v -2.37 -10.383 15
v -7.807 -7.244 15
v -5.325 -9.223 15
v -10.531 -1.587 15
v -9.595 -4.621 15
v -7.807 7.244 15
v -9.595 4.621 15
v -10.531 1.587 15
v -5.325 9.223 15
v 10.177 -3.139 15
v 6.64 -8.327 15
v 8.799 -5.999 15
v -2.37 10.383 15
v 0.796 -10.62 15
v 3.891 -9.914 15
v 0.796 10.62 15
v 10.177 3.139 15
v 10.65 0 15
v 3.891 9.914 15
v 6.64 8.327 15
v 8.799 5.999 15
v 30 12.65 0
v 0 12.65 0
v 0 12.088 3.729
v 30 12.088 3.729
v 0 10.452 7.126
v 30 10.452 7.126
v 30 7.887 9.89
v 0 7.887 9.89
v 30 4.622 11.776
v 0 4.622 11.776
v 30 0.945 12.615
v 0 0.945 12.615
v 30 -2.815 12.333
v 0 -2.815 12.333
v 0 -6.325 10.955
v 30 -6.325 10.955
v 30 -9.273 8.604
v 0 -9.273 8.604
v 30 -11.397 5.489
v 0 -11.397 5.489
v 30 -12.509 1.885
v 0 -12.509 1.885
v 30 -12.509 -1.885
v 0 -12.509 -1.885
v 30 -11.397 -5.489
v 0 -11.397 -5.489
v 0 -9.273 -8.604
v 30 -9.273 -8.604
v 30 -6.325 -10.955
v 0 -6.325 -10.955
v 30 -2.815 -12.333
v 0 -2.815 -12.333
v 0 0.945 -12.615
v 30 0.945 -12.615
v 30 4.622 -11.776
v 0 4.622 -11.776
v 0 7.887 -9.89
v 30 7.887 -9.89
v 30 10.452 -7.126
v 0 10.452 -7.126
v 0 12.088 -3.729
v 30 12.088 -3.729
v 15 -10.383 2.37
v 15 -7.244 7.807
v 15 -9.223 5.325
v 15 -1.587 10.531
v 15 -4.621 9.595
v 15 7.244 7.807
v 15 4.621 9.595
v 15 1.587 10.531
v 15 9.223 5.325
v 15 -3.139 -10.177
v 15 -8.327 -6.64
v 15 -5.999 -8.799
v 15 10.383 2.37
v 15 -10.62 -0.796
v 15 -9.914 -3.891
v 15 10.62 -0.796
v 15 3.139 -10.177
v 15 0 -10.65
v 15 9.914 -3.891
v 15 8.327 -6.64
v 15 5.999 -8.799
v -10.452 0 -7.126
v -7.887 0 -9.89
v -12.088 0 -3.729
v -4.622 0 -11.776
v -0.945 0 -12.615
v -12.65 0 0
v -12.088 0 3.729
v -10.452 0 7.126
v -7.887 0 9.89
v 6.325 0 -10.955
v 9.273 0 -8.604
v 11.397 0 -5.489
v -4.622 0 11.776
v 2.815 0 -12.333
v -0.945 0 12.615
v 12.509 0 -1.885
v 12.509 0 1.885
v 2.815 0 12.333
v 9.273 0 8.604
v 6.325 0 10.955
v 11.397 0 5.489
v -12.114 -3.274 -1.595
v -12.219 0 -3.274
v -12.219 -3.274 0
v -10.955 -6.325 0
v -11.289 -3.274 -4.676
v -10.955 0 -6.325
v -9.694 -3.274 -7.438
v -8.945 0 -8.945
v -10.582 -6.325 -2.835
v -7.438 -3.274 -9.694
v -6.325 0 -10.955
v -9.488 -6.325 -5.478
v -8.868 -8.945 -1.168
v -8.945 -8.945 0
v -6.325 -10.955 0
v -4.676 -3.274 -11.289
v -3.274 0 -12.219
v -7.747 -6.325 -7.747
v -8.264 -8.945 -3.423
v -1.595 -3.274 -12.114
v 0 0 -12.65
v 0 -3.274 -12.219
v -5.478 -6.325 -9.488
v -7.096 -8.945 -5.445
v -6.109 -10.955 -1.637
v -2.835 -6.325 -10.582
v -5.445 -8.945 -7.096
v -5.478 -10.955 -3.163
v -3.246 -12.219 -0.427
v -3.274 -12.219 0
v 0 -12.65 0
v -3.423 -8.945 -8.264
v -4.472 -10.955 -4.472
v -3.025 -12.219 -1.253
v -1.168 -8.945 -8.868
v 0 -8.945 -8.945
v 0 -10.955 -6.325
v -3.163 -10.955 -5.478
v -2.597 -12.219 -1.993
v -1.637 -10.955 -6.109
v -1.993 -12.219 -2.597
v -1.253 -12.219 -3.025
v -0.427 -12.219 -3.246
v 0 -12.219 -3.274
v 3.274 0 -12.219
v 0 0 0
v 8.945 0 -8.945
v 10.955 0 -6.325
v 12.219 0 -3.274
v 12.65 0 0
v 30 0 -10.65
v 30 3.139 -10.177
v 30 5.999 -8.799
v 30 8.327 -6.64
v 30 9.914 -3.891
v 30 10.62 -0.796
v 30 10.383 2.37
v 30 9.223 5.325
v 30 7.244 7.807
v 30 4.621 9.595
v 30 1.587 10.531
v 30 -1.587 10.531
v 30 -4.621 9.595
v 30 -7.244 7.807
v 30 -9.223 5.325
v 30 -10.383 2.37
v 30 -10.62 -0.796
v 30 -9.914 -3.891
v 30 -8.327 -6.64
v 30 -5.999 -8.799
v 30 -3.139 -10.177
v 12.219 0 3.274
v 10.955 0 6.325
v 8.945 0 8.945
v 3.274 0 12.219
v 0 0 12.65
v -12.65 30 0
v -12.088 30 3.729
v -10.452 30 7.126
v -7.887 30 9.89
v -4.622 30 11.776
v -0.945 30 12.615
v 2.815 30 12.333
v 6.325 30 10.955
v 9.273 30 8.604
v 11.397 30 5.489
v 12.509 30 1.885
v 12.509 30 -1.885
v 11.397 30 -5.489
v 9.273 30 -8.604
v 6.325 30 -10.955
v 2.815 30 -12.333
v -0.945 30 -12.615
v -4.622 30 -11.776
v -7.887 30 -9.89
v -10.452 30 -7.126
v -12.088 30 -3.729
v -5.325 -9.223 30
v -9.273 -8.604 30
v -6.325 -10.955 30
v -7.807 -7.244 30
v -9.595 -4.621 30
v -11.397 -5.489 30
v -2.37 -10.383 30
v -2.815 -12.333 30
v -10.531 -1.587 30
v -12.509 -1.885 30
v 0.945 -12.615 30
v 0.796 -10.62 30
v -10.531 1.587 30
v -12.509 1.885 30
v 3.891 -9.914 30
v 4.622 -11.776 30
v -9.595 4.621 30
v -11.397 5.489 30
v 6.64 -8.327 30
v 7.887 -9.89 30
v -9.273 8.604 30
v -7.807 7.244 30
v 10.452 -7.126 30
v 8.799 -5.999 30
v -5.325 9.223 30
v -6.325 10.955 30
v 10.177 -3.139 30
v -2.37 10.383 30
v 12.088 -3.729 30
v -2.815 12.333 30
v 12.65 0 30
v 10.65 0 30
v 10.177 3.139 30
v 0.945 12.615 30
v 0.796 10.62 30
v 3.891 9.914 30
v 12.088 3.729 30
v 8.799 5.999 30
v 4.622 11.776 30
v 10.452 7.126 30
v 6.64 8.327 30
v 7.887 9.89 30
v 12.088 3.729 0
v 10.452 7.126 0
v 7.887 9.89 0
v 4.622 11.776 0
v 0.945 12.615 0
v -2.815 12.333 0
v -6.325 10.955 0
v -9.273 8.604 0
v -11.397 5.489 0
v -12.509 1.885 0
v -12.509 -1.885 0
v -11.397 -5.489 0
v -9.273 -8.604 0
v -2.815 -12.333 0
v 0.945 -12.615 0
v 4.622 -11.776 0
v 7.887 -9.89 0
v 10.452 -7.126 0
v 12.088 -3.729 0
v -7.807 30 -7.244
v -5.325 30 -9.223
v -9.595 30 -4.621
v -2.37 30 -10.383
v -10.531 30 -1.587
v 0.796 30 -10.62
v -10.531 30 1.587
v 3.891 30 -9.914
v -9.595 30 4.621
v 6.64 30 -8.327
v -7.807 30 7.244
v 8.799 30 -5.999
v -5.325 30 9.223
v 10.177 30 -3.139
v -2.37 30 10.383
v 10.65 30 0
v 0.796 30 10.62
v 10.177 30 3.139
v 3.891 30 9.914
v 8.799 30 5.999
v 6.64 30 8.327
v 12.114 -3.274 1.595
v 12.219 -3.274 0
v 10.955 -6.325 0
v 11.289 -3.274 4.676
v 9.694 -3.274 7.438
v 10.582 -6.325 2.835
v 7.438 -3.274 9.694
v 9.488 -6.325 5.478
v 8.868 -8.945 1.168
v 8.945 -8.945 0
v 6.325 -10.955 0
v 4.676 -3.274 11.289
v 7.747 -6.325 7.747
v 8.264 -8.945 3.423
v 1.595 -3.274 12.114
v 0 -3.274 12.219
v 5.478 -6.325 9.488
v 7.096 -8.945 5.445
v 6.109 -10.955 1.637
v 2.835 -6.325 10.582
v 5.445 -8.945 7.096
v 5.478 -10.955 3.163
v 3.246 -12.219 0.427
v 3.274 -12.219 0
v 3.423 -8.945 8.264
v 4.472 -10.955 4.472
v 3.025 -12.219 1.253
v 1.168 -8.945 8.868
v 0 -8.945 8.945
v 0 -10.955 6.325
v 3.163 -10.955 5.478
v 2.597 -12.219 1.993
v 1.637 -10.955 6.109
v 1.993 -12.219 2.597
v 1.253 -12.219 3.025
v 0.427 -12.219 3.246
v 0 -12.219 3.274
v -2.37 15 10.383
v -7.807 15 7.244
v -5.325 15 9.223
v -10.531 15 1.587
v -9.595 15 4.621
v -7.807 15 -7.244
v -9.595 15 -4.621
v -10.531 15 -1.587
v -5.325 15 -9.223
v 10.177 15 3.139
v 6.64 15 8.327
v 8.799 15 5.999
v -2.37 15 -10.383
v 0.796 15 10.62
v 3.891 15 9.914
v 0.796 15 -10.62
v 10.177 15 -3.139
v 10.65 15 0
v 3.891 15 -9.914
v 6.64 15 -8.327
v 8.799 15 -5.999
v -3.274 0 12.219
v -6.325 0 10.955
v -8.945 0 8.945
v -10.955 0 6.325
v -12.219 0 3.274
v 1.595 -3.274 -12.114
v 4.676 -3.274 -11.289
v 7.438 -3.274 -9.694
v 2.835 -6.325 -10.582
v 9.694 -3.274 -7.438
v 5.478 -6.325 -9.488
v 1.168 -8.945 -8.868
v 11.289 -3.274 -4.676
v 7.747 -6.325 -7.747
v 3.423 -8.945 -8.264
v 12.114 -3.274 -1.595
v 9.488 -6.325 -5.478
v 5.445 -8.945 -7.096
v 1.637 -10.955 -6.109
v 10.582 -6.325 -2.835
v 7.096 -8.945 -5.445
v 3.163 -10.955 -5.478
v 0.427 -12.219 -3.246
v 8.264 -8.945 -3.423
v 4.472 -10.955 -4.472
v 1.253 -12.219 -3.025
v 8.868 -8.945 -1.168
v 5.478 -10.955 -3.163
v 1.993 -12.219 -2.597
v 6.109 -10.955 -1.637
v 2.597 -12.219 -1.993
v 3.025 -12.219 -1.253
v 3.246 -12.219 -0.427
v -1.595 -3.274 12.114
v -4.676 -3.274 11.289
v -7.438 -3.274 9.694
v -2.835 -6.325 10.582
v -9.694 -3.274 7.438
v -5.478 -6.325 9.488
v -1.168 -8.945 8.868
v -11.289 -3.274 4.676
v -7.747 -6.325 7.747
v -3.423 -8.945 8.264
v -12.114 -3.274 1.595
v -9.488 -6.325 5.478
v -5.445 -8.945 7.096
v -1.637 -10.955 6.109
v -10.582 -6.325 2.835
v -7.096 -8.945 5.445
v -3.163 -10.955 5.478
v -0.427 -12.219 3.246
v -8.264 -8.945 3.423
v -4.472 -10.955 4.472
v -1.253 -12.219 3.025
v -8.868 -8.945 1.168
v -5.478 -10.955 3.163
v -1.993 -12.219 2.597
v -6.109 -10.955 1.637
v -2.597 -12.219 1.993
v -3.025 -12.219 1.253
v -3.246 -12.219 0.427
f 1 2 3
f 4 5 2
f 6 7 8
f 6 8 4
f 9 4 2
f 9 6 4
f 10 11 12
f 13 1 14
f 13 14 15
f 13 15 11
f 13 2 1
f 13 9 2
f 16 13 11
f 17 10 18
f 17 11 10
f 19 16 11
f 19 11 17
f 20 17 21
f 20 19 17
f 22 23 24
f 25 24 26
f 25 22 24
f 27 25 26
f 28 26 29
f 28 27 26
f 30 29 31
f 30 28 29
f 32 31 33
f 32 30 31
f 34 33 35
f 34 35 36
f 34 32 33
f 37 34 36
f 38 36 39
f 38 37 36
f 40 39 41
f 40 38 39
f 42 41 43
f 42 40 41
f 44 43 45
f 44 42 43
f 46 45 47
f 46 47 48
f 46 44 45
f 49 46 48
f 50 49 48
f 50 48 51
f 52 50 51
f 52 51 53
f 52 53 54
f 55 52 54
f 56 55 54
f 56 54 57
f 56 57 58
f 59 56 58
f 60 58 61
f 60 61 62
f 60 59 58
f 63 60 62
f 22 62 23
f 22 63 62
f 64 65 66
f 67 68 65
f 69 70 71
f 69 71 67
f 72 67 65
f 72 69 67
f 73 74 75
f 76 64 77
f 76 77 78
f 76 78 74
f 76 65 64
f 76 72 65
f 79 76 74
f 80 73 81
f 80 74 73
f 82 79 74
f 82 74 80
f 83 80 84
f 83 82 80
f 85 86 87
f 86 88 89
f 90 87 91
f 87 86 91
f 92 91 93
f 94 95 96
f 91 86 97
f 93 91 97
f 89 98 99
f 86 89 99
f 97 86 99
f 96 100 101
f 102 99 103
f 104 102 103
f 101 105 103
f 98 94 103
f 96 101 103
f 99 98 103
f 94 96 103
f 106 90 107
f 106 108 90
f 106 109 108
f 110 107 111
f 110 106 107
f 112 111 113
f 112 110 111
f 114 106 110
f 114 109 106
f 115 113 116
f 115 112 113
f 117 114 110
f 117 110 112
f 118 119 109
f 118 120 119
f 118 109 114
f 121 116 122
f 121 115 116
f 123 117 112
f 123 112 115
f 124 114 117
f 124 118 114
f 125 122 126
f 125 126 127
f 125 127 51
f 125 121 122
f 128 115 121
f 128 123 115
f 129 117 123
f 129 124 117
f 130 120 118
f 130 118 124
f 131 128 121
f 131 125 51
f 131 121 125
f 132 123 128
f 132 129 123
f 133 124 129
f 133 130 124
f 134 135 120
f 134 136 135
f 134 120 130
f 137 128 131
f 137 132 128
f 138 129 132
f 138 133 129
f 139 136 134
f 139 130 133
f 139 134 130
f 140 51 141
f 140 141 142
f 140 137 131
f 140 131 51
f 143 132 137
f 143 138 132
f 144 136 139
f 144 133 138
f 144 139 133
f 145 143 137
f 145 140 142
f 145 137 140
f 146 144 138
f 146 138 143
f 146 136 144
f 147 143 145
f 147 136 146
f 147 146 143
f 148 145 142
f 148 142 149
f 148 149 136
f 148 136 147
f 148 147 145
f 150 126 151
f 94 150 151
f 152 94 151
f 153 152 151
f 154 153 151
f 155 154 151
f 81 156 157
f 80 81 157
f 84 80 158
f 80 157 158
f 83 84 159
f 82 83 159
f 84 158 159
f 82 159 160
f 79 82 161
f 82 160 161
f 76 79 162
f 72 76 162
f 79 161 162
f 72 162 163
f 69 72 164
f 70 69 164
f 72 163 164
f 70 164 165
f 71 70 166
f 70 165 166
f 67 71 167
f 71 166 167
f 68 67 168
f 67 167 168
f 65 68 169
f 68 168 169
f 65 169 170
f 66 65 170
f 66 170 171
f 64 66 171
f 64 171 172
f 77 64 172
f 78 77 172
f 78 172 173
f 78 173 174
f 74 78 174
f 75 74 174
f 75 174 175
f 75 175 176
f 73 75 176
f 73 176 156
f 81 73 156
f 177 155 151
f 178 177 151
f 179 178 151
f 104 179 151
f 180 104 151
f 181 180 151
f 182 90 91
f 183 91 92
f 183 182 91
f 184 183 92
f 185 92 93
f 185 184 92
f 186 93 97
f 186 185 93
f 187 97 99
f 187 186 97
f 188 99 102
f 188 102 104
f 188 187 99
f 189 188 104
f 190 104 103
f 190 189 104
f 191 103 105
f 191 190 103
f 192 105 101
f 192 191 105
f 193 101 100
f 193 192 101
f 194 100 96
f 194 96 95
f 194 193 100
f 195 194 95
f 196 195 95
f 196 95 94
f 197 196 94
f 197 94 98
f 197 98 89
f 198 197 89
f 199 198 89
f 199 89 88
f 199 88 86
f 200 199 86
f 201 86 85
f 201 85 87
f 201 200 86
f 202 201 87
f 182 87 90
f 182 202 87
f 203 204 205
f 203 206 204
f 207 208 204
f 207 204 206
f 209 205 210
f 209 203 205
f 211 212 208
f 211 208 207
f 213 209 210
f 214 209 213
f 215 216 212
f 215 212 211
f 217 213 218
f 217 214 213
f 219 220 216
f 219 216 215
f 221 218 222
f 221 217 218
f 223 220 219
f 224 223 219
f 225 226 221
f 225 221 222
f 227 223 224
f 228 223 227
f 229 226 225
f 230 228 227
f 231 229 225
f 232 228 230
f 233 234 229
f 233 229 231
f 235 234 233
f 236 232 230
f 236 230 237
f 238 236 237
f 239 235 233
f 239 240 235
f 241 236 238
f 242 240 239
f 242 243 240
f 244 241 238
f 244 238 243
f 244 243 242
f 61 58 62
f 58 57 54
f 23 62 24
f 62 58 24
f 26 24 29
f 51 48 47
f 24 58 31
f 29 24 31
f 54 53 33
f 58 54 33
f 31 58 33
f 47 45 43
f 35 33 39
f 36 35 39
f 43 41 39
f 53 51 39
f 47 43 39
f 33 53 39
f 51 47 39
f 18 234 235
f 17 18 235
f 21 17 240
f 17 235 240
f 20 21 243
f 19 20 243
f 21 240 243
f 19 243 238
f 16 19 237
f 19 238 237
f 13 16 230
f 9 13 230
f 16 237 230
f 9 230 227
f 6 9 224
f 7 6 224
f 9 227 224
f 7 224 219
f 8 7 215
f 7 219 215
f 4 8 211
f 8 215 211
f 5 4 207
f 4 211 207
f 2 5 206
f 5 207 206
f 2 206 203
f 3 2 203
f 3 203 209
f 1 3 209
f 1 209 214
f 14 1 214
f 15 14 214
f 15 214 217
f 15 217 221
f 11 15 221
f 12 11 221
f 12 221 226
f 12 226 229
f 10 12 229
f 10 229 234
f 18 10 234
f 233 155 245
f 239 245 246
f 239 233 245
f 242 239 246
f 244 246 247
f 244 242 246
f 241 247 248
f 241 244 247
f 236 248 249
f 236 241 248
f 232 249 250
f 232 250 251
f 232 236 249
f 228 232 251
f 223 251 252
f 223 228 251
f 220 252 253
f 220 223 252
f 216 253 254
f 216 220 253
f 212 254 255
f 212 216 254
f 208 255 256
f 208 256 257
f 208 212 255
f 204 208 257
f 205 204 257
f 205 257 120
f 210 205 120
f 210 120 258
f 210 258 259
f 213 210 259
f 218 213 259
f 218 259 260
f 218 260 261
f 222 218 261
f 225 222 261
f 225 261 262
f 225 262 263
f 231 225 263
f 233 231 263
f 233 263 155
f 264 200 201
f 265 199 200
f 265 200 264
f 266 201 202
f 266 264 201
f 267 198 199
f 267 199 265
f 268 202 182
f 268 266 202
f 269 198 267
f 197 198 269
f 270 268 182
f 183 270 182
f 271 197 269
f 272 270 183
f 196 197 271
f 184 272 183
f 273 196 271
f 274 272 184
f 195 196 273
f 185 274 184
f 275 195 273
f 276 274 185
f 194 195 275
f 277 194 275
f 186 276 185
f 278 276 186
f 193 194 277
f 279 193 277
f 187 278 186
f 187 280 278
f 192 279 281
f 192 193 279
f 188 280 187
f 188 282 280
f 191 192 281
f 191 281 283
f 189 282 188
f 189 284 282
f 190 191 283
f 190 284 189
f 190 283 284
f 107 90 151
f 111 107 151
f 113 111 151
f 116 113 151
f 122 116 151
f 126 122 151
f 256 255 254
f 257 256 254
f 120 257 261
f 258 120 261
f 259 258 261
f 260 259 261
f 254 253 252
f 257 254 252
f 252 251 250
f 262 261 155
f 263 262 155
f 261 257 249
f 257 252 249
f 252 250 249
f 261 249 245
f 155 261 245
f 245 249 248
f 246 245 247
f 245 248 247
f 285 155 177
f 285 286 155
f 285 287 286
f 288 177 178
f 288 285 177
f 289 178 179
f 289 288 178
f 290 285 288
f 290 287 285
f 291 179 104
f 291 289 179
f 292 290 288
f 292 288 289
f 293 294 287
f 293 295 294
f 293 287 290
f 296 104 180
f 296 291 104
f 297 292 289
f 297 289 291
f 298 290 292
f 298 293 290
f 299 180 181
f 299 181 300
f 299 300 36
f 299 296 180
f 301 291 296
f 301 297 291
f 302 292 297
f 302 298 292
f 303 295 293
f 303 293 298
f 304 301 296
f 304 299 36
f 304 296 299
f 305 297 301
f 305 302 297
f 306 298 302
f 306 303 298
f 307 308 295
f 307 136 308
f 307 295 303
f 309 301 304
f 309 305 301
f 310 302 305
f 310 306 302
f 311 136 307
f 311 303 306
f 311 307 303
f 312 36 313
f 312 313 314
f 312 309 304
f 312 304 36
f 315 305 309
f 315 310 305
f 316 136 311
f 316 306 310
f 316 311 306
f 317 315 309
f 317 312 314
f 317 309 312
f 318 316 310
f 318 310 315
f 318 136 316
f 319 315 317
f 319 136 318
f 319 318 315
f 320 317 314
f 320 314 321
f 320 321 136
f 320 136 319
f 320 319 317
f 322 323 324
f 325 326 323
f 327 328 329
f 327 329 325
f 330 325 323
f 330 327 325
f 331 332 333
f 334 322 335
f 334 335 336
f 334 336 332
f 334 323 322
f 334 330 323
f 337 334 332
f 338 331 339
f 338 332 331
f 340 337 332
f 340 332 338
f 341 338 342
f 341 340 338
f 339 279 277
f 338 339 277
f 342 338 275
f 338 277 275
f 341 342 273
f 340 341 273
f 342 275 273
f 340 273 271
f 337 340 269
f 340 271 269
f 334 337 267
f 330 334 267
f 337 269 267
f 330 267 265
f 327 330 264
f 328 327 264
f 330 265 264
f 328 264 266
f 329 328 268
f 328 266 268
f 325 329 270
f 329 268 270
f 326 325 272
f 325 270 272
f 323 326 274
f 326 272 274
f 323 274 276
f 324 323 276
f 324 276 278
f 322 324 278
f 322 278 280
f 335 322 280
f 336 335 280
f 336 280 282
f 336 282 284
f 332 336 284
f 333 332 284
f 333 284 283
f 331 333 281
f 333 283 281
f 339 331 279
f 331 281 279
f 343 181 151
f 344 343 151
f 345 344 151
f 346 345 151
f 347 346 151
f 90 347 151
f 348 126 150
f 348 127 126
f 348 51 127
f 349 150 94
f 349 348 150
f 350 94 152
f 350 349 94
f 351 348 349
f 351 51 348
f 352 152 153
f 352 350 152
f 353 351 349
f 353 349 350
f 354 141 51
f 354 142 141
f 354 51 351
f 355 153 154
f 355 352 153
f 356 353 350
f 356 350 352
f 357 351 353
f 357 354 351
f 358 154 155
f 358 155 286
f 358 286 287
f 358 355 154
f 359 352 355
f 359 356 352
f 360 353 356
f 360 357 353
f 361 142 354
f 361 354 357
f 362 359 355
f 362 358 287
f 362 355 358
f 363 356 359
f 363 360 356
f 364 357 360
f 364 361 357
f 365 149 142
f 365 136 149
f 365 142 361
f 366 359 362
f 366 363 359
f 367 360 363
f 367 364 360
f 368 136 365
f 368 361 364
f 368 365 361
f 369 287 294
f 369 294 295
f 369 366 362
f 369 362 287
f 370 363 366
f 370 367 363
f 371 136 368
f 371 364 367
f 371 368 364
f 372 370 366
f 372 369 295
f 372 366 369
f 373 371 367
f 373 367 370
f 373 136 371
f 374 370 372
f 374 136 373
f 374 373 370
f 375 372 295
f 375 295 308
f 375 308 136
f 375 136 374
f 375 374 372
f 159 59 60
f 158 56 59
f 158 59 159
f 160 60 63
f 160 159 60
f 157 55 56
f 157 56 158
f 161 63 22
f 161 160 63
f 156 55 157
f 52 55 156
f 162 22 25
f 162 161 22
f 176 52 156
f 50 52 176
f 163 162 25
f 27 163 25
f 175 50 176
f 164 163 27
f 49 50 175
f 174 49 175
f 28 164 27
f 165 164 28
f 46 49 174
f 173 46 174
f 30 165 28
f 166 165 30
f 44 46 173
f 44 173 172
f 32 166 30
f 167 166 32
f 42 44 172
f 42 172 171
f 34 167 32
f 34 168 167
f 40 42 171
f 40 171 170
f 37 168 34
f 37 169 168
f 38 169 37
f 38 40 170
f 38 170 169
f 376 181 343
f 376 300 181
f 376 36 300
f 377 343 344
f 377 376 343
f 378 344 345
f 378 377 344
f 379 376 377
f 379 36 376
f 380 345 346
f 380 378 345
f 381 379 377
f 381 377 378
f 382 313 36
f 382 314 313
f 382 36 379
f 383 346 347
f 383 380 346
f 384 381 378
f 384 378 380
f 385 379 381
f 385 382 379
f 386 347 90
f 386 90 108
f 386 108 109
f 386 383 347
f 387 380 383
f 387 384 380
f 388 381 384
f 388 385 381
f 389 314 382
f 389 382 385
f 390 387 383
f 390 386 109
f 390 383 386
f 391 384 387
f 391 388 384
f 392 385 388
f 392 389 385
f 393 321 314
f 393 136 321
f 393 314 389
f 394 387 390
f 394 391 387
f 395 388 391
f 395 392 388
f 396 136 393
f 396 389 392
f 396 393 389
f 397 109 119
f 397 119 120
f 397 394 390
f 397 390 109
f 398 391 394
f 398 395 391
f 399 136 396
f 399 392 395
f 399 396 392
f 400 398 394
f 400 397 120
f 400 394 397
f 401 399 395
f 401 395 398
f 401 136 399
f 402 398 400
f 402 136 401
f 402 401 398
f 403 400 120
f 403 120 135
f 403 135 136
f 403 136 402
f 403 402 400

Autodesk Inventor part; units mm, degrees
sketch "Sketch1" plane through (0, 0, 0) normal (0, 1, 0) x (-1, 0, 0)
  line L0 (0, 0) -> (0, 30)
  line L1 (0, 0) -> (-30, 0)
  dimension "d0" = 30
  dimension "d1" = 30
ref_plane "Work Plane1" through (0, 0, 30) normal (0, 0, 1) x (1, 0, 0)
sketch "Sketch2" plane through (0, 0, 30) normal (0, 0, 1) x (1, 0, 0)
  circle A0 centre (0, 0) radius 12.65
  dimension "d2" = 25.3
sketch "Sketch3" plane through (0, 0, 0) normal (0, 1, 0) x (-1, 0, 0)
  line L0 (0, 0) -> (0, 30) projected
sweep "Sweep1" add profiles "Sketch2" path "Sketch3"
sketch "Sketch4" plane through (0, 0, 0) normal (1, 0, 0) x (0, 1, 0)
  line L0 (0, 0) -> (30, 0)
  dimension "d5" = 30
ref_plane "Work Plane2" through (0, 30, 0) normal (0, 1, 0) x (-1, 0, 0)
sketch "Sketch5" plane through (0, 30, 0) normal (0, 1, 0) x (-1, 0, 0)
  circle A0 centre (0, 0) radius 12.65
  dimension "d6" = 25.3
sweep "Sweep2" add profiles "Sketch5" path "Sketch4" separate body
sketch "Sketch6" plane through (0, 0, 0) normal (0, 1, 0) x (-1, 0, 0)
  line L0 (0, 0) -> (-30, 0) projected
ref_plane "Work Plane3" through (30, 0, 0) normal (1, 0, 0) x (0, 1, 0)
sketch "Sketch7" plane through (30, 0, 0) normal (1, 0, 0) x (0, 1, 0)
  circle A0 centre (0, 0) radius 12.65
  dimension "d9" = 25.3
sweep "Sweep3" add profiles "Sketch7" path "Sketch6" separate body
sketch "Sketch8" plane through (0, 0, 0) normal (-1, 0, 0) x (0, 0, 1)
  circle A0 centre (0, 0) radius 12.65 projected
  line L0 (-12.65, 0) -> (12.65, 0) projected
  line L1 (0, 12.65) -> (0, -12.65) projected
sketch "Sketch10" plane through (0, 0, 0) normal (0, -1, 0) x (1, 0, 0)
  circle A0 centre (0, 0) radius 12.65 projected
sketch3d "3D Sketch1"
  arc A0 (-12.65, 0, 0) -> (0, 0, -12.65) centre (0, 0, 0) ccw
  arc A1 (0, 0, -12.65) -> (12.65, 0, 0) centre (0, 0, 0) ccw
  arc A2 (12.65, 0, 0) -> (0, 0, 12.65) centre (0, 0, 0) ccw
  arc A3 (0, 0, 12.65) -> (-12.65, 0, 0) centre (0, 0, 0) ccw
sweep "Sweep4" add profiles "Sketch8" path "3D Sketch1" separate body picked at (-0.9383, -8.3276) contours A0 L0 L1
sketch "Sketch12" plane through (0, 30, 0) normal (0, 1, 0) x (1, 0, 0)
  circle A0 centre (0, 0) radius 10.65
  dimension "d16" = 21.3
extrude "Extrusion1" cut sketch "Sketch12" against normal blind 15 bodies 2
sketch "Sketch13" plane through (30, 0, 0) normal (1, 0, 0) x (0, 0, -1)
  circle A0 centre (0, 0) radius 10.65
  dimension "d19" = 21.3
extrude "Extrusion2" cut sketch "Sketch13" against normal blind 15 bodies 3
sketch "Sketch14" plane through (0, 0, 30) normal (0, 0, 1) x (1, 0, 0)
  circle A0 centre (0, 0) radius 10.65
  dimension "d22" = 21.3
extrude "Extrusion3" cut sketch "Sketch14" against normal blind 15 bodies 1
equation "\"d1\" = d0"
properties part number "hoek drieweg" material "ABS Plastic"
